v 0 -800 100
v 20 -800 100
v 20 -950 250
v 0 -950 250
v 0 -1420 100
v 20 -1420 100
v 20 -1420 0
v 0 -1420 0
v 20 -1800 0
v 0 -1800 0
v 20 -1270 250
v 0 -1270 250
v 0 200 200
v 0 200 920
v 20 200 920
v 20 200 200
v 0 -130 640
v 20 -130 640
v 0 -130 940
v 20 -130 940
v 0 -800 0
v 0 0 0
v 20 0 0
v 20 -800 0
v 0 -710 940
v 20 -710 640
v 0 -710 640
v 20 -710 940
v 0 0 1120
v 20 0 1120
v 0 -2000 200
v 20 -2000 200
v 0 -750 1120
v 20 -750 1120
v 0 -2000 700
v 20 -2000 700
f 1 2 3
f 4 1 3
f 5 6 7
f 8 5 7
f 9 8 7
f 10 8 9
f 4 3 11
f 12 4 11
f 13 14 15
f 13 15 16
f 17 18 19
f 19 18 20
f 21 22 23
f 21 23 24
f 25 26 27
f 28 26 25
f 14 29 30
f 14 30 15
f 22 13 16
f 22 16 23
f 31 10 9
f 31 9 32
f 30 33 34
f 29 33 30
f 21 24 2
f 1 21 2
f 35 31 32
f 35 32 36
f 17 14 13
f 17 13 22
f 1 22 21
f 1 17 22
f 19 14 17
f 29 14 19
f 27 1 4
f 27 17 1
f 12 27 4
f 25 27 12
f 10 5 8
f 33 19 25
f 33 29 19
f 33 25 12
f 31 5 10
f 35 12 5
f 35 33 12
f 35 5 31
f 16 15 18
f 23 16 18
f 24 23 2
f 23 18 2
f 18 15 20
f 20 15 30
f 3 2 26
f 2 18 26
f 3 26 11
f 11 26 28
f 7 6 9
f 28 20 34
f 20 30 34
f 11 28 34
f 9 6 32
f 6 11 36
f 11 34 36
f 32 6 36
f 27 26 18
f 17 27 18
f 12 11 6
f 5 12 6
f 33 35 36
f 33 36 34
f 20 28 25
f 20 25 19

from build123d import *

# Parameters (mm, degrees)
PAD_DEPTH       = 20
POCKET_DEPTH    = 20
SKETCH002_W     = 580
SKETCH002_H     = 300
POCKET001_DEPTH = 20


with BuildPart() as part:
    # Sketch → Pad (new body)
    with BuildSketch(Plane.YZ):
        Polygon((-2000, 200), (-2000, 700), (-750, 1120), (0, 1120), (200, 920), (200, 200), (0, 0), (-1800, 0), align=None)
    extrude(amount=PAD_DEPTH)

    # Sketch001 (on Face10 of Pad) → Pocket (cut)
    with BuildSketch(Plane.YZ.offset(20)):
        Polygon((-950, 250), (-1270, 250), (-1420, 100), (-1420, 0), (-800, 0), (-800, 100), align=None)
    extrude(amount=-POCKET_DEPTH, mode=Mode.SUBTRACT)

    # Sketch002 (on Face5 of Pocket) → Pocket001 (cut)
    with BuildSketch(Plane.YZ.offset(20)):
        with Locations((-420, 790)):
            Rectangle(SKETCH002_W, SKETCH002_H)
    extrude(amount=-POCKET001_DEPTH, mode=Mode.SUBTRACT)


solid = part.part
